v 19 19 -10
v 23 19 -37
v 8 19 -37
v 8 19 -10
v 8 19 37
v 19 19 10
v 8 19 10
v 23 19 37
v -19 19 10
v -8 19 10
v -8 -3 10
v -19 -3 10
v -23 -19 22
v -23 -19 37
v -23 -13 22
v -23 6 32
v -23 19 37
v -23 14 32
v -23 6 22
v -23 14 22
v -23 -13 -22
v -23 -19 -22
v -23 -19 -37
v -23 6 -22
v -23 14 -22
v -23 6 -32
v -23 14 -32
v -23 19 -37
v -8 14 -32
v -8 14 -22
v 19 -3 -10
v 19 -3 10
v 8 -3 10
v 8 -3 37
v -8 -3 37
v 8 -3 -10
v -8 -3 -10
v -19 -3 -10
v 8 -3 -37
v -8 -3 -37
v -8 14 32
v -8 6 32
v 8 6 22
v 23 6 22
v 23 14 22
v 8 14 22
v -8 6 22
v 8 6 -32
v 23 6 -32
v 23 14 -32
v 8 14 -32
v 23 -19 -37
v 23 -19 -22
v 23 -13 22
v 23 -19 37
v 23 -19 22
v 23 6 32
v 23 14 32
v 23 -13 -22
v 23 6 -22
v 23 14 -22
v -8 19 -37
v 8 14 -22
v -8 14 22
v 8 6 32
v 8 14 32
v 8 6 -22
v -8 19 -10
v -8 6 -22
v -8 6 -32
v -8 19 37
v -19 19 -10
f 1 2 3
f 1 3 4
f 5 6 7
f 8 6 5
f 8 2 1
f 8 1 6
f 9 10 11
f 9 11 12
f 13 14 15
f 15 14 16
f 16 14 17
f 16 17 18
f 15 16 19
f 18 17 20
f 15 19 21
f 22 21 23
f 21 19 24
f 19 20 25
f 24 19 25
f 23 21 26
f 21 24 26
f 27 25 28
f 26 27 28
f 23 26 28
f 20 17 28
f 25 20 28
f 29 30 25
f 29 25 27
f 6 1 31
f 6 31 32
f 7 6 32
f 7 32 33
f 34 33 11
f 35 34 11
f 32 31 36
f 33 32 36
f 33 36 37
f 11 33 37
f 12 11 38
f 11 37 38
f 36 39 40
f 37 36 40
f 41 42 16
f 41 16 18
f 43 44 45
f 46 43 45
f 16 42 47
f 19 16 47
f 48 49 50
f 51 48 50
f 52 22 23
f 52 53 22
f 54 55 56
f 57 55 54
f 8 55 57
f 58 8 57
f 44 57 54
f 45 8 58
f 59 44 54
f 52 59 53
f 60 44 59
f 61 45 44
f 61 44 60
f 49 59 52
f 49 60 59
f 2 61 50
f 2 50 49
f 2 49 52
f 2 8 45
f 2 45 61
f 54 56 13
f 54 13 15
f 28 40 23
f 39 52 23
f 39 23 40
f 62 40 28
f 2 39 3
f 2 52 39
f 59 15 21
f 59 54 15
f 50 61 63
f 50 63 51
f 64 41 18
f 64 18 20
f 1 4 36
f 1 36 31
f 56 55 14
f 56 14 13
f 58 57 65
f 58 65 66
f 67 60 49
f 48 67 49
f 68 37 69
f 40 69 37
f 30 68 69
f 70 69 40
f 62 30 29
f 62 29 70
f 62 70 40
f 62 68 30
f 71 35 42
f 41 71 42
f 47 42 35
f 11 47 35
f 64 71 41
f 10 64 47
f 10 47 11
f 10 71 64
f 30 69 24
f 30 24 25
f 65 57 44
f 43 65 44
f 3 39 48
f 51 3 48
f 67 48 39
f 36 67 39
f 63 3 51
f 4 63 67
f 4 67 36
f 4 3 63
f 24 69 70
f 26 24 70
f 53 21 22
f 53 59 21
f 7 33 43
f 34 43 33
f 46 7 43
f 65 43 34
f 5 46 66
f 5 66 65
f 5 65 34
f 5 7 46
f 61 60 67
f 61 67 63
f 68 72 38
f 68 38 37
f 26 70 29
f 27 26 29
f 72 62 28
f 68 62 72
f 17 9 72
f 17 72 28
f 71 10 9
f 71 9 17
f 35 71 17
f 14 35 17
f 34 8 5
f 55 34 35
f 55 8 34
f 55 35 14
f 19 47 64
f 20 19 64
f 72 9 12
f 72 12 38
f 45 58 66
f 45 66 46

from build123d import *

# Parameters (mm, degrees)
SALIENTE_EXTRUIR1_DEPTH = 23
CORTAR_EXTRUIR1_DEPTH   = 22
CROQUIS3_W              = 10
CROQUIS3_H              = 8
CORTAR_EXTRUIR2_DEPTH   = 63.016126935


with BuildPart() as part:
    # Croquis1 → Saliente-Extruir1 (new, symmetric)
    with BuildSketch(Plane(origin=(0, 0, 0), x_dir=(0, 0, -1), z_dir=(1, 0, 0))):
        Polygon((22, -19), (37, -19), (37, 19), (-37, 19), (-37, -19), (-22, -19), (-22, -13), (22, -13), align=None)
    extrude(amount=SALIENTE_EXTRUIR1_DEPTH, both=True)

    # Croquis2 → Cortar-Extruir1 (cut)
    with BuildSketch(Plane(origin=(0, 19, 0), x_dir=(1, 0, 0), z_dir=(0, 1, 0))):
        Polygon((-8, 37), (8, 37), (8, 10), (19, 10), (19, -10), (8, -10), (8, -37), (-8, -37), (-8, -10), (-19, -10), (-19, 10), (-8, 10), align=None)
    extrude(amount=-CORTAR_EXTRUIR1_DEPTH, mode=Mode.SUBTRACT)

    # Croquis3 → Cortar-Extruir2 (cut, through all)
    with BuildSketch(Plane(origin=(23, 0, 0), x_dir=(0, 0, -1), z_dir=(1, 0, 0))):
        with Locations((27, 10)):
            Rectangle(CROQUIS3_W, CROQUIS3_H)
        with Locations((-27, 10)):
            Rectangle(CROQUIS3_W, CROQUIS3_H)
    extrude(amount=-CORTAR_EXTRUIR2_DEPTH, mode=Mode.SUBTRACT)


solid = part.part
